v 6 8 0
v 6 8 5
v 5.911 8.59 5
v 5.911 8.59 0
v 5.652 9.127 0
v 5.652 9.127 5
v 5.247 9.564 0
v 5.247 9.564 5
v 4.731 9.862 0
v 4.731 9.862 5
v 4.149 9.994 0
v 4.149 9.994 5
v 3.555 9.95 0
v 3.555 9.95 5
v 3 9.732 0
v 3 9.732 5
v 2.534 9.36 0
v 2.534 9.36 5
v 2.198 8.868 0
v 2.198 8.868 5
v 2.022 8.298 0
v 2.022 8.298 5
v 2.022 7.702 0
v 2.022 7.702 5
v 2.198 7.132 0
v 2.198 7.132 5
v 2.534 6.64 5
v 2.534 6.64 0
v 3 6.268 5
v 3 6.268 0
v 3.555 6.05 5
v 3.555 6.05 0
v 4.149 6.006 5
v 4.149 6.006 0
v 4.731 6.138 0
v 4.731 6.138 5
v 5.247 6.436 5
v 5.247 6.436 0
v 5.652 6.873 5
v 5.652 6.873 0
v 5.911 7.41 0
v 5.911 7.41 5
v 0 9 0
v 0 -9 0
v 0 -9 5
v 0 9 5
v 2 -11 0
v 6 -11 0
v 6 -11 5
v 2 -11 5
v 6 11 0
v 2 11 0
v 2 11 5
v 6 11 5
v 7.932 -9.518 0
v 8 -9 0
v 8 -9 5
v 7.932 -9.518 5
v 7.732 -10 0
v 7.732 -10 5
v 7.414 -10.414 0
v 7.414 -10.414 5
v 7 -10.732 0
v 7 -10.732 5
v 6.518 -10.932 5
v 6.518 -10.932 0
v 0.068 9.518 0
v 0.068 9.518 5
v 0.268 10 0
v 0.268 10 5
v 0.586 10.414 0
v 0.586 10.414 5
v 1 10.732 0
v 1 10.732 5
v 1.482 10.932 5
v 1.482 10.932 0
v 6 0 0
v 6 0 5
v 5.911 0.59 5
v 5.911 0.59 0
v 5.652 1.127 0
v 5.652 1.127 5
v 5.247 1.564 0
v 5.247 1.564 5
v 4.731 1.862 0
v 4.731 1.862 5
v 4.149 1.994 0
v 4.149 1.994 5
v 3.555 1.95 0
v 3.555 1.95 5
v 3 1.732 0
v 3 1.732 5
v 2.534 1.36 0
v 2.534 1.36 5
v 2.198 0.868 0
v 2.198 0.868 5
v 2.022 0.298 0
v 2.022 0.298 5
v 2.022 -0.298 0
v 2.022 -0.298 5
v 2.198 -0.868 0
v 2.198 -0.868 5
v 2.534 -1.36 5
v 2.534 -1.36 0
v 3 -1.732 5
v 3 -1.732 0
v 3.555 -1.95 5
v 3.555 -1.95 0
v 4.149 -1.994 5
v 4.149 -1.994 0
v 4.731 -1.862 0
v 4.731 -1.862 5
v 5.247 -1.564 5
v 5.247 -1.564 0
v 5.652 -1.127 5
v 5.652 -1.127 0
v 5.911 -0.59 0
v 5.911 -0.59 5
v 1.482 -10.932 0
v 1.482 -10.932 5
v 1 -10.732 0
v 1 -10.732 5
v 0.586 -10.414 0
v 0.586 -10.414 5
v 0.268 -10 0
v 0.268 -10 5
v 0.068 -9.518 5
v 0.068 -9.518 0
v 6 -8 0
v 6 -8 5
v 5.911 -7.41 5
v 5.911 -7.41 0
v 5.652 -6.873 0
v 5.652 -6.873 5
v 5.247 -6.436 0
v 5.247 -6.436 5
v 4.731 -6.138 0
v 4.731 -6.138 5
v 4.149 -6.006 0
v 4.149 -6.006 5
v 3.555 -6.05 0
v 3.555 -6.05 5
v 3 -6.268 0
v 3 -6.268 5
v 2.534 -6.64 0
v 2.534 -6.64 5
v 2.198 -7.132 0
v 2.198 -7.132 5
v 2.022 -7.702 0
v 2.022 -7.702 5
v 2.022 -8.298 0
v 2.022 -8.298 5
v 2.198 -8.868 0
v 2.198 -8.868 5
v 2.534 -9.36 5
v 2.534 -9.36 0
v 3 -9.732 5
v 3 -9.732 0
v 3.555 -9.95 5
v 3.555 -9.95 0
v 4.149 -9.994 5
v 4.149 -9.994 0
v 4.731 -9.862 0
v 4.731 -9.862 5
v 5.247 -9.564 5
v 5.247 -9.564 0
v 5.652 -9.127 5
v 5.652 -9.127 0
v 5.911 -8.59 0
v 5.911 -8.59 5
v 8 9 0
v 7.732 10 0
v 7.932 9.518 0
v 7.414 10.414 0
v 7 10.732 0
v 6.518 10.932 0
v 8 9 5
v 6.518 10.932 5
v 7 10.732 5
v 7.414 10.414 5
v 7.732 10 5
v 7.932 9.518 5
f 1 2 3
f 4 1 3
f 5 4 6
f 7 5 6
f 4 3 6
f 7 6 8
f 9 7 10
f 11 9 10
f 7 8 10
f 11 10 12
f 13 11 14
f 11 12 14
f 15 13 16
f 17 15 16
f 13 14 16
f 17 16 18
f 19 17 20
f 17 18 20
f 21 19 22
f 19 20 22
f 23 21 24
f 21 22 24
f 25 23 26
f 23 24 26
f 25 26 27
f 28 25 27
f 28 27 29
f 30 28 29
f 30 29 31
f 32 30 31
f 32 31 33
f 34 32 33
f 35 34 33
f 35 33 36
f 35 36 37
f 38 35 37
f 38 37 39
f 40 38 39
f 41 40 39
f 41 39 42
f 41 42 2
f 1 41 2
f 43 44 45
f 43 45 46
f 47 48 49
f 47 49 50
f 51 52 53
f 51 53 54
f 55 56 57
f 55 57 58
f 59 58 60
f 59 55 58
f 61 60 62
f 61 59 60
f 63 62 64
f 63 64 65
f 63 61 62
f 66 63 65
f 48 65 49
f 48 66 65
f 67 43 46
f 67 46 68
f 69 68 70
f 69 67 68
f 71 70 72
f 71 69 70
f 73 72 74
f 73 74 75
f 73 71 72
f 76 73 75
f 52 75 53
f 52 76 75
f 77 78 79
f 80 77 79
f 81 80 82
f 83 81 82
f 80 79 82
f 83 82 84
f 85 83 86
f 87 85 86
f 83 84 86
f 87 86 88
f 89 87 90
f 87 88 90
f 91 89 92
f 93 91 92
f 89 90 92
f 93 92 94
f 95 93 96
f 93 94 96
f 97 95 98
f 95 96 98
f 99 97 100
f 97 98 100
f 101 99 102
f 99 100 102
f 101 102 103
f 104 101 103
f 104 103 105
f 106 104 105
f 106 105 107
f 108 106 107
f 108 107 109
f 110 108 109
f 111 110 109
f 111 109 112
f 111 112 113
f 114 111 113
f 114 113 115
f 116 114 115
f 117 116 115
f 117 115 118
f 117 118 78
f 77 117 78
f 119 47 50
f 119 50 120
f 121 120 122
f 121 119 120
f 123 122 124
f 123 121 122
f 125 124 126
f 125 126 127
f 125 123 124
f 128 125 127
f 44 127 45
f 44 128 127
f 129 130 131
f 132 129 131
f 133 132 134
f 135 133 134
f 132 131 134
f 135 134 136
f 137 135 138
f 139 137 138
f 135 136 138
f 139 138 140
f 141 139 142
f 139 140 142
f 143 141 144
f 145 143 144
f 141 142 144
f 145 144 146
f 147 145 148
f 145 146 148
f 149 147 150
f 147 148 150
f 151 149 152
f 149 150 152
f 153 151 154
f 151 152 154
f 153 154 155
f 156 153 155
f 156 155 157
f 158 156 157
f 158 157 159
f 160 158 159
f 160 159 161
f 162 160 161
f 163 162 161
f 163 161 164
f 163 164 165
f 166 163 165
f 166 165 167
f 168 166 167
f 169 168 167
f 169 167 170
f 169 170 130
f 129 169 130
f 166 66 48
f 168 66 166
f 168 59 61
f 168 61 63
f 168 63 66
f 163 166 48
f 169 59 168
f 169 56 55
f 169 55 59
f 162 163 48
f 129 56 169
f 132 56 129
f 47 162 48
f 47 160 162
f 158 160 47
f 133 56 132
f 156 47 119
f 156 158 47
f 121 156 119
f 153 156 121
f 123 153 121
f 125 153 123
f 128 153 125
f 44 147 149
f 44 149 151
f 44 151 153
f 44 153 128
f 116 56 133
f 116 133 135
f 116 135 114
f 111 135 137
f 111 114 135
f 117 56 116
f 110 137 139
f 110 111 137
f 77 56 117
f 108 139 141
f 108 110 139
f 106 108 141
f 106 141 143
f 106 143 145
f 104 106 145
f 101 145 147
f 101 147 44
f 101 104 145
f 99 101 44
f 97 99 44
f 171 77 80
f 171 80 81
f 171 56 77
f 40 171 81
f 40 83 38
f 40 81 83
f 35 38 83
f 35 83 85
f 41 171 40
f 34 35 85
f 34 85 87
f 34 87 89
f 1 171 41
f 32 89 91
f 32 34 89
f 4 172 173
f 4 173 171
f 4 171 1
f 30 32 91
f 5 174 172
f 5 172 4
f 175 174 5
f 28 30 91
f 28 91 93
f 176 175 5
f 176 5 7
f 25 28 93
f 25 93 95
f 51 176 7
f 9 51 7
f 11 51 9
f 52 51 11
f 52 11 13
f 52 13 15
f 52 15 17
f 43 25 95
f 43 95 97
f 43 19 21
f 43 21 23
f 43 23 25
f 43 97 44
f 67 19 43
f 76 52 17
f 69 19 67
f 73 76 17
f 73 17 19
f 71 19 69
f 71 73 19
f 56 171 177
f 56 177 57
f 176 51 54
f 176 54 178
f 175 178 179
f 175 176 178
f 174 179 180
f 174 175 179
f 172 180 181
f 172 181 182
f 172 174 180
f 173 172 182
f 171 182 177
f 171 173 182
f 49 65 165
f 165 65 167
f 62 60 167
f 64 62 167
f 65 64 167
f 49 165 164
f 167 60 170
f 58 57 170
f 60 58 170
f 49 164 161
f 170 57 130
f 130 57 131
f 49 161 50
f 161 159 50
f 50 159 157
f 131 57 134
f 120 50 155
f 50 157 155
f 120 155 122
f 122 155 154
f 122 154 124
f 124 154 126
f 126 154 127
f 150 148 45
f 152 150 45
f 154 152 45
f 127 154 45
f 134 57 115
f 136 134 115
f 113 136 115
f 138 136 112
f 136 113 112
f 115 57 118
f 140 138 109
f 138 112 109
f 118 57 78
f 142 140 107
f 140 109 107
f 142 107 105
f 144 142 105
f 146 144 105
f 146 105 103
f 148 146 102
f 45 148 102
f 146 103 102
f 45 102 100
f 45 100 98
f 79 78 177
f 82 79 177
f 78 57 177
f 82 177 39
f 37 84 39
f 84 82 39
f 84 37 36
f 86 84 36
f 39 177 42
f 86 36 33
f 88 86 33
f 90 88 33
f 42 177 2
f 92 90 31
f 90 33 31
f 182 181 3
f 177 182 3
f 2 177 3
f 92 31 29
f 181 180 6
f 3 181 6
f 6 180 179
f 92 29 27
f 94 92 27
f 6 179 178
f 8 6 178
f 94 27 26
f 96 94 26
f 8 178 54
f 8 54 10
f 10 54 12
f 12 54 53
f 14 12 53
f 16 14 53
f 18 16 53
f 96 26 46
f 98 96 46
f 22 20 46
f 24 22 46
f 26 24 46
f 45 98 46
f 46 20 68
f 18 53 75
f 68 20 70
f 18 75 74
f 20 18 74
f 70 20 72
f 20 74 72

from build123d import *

# Parameters (mm, degrees)
BOSS_EXTRUDE1_DEPTH = 5
SKETCH3_R           = 2
CUT_EXTRUDE2_DEPTH  = 6


with BuildPart() as part:
    # Sketch1 → Boss-Extrude1 (new body)
    with BuildSketch(Plane.XY):
        with BuildLine():
            Line((0, -9), (0, 9))
            ThreePointArc((0, 9), (0.585786438, 10.414213562), (2, 11))
            Line((2, 11), (6, 11))
            ThreePointArc((6, 11), (7.414213562, 10.414213562), (8, 9))
            Line((8, 9), (8, -9))
            ThreePointArc((8, -9), (7.414213562, -10.414213562), (6, -11))
            Line((6, -11), (2, -11))
            ThreePointArc((2, -11), (0.585786438, -10.414213562), (0, -9))
        make_face()
    extrude(amount=BOSS_EXTRUDE1_DEPTH)

    # Sketch3 → Cut-Extrude2 (cut, through all)
    with BuildSketch(Plane.XY.offset(5)):
        with Locations((4, 0)):
            Circle(SKETCH3_R)
        with Locations((4, 8)):
            Circle(SKETCH3_R)
        with Locations((4, -8)):
            Circle(SKETCH3_R)
    extrude(amount=-CUT_EXTRUDE2_DEPTH, mode=Mode.SUBTRACT)


solid = part.part
